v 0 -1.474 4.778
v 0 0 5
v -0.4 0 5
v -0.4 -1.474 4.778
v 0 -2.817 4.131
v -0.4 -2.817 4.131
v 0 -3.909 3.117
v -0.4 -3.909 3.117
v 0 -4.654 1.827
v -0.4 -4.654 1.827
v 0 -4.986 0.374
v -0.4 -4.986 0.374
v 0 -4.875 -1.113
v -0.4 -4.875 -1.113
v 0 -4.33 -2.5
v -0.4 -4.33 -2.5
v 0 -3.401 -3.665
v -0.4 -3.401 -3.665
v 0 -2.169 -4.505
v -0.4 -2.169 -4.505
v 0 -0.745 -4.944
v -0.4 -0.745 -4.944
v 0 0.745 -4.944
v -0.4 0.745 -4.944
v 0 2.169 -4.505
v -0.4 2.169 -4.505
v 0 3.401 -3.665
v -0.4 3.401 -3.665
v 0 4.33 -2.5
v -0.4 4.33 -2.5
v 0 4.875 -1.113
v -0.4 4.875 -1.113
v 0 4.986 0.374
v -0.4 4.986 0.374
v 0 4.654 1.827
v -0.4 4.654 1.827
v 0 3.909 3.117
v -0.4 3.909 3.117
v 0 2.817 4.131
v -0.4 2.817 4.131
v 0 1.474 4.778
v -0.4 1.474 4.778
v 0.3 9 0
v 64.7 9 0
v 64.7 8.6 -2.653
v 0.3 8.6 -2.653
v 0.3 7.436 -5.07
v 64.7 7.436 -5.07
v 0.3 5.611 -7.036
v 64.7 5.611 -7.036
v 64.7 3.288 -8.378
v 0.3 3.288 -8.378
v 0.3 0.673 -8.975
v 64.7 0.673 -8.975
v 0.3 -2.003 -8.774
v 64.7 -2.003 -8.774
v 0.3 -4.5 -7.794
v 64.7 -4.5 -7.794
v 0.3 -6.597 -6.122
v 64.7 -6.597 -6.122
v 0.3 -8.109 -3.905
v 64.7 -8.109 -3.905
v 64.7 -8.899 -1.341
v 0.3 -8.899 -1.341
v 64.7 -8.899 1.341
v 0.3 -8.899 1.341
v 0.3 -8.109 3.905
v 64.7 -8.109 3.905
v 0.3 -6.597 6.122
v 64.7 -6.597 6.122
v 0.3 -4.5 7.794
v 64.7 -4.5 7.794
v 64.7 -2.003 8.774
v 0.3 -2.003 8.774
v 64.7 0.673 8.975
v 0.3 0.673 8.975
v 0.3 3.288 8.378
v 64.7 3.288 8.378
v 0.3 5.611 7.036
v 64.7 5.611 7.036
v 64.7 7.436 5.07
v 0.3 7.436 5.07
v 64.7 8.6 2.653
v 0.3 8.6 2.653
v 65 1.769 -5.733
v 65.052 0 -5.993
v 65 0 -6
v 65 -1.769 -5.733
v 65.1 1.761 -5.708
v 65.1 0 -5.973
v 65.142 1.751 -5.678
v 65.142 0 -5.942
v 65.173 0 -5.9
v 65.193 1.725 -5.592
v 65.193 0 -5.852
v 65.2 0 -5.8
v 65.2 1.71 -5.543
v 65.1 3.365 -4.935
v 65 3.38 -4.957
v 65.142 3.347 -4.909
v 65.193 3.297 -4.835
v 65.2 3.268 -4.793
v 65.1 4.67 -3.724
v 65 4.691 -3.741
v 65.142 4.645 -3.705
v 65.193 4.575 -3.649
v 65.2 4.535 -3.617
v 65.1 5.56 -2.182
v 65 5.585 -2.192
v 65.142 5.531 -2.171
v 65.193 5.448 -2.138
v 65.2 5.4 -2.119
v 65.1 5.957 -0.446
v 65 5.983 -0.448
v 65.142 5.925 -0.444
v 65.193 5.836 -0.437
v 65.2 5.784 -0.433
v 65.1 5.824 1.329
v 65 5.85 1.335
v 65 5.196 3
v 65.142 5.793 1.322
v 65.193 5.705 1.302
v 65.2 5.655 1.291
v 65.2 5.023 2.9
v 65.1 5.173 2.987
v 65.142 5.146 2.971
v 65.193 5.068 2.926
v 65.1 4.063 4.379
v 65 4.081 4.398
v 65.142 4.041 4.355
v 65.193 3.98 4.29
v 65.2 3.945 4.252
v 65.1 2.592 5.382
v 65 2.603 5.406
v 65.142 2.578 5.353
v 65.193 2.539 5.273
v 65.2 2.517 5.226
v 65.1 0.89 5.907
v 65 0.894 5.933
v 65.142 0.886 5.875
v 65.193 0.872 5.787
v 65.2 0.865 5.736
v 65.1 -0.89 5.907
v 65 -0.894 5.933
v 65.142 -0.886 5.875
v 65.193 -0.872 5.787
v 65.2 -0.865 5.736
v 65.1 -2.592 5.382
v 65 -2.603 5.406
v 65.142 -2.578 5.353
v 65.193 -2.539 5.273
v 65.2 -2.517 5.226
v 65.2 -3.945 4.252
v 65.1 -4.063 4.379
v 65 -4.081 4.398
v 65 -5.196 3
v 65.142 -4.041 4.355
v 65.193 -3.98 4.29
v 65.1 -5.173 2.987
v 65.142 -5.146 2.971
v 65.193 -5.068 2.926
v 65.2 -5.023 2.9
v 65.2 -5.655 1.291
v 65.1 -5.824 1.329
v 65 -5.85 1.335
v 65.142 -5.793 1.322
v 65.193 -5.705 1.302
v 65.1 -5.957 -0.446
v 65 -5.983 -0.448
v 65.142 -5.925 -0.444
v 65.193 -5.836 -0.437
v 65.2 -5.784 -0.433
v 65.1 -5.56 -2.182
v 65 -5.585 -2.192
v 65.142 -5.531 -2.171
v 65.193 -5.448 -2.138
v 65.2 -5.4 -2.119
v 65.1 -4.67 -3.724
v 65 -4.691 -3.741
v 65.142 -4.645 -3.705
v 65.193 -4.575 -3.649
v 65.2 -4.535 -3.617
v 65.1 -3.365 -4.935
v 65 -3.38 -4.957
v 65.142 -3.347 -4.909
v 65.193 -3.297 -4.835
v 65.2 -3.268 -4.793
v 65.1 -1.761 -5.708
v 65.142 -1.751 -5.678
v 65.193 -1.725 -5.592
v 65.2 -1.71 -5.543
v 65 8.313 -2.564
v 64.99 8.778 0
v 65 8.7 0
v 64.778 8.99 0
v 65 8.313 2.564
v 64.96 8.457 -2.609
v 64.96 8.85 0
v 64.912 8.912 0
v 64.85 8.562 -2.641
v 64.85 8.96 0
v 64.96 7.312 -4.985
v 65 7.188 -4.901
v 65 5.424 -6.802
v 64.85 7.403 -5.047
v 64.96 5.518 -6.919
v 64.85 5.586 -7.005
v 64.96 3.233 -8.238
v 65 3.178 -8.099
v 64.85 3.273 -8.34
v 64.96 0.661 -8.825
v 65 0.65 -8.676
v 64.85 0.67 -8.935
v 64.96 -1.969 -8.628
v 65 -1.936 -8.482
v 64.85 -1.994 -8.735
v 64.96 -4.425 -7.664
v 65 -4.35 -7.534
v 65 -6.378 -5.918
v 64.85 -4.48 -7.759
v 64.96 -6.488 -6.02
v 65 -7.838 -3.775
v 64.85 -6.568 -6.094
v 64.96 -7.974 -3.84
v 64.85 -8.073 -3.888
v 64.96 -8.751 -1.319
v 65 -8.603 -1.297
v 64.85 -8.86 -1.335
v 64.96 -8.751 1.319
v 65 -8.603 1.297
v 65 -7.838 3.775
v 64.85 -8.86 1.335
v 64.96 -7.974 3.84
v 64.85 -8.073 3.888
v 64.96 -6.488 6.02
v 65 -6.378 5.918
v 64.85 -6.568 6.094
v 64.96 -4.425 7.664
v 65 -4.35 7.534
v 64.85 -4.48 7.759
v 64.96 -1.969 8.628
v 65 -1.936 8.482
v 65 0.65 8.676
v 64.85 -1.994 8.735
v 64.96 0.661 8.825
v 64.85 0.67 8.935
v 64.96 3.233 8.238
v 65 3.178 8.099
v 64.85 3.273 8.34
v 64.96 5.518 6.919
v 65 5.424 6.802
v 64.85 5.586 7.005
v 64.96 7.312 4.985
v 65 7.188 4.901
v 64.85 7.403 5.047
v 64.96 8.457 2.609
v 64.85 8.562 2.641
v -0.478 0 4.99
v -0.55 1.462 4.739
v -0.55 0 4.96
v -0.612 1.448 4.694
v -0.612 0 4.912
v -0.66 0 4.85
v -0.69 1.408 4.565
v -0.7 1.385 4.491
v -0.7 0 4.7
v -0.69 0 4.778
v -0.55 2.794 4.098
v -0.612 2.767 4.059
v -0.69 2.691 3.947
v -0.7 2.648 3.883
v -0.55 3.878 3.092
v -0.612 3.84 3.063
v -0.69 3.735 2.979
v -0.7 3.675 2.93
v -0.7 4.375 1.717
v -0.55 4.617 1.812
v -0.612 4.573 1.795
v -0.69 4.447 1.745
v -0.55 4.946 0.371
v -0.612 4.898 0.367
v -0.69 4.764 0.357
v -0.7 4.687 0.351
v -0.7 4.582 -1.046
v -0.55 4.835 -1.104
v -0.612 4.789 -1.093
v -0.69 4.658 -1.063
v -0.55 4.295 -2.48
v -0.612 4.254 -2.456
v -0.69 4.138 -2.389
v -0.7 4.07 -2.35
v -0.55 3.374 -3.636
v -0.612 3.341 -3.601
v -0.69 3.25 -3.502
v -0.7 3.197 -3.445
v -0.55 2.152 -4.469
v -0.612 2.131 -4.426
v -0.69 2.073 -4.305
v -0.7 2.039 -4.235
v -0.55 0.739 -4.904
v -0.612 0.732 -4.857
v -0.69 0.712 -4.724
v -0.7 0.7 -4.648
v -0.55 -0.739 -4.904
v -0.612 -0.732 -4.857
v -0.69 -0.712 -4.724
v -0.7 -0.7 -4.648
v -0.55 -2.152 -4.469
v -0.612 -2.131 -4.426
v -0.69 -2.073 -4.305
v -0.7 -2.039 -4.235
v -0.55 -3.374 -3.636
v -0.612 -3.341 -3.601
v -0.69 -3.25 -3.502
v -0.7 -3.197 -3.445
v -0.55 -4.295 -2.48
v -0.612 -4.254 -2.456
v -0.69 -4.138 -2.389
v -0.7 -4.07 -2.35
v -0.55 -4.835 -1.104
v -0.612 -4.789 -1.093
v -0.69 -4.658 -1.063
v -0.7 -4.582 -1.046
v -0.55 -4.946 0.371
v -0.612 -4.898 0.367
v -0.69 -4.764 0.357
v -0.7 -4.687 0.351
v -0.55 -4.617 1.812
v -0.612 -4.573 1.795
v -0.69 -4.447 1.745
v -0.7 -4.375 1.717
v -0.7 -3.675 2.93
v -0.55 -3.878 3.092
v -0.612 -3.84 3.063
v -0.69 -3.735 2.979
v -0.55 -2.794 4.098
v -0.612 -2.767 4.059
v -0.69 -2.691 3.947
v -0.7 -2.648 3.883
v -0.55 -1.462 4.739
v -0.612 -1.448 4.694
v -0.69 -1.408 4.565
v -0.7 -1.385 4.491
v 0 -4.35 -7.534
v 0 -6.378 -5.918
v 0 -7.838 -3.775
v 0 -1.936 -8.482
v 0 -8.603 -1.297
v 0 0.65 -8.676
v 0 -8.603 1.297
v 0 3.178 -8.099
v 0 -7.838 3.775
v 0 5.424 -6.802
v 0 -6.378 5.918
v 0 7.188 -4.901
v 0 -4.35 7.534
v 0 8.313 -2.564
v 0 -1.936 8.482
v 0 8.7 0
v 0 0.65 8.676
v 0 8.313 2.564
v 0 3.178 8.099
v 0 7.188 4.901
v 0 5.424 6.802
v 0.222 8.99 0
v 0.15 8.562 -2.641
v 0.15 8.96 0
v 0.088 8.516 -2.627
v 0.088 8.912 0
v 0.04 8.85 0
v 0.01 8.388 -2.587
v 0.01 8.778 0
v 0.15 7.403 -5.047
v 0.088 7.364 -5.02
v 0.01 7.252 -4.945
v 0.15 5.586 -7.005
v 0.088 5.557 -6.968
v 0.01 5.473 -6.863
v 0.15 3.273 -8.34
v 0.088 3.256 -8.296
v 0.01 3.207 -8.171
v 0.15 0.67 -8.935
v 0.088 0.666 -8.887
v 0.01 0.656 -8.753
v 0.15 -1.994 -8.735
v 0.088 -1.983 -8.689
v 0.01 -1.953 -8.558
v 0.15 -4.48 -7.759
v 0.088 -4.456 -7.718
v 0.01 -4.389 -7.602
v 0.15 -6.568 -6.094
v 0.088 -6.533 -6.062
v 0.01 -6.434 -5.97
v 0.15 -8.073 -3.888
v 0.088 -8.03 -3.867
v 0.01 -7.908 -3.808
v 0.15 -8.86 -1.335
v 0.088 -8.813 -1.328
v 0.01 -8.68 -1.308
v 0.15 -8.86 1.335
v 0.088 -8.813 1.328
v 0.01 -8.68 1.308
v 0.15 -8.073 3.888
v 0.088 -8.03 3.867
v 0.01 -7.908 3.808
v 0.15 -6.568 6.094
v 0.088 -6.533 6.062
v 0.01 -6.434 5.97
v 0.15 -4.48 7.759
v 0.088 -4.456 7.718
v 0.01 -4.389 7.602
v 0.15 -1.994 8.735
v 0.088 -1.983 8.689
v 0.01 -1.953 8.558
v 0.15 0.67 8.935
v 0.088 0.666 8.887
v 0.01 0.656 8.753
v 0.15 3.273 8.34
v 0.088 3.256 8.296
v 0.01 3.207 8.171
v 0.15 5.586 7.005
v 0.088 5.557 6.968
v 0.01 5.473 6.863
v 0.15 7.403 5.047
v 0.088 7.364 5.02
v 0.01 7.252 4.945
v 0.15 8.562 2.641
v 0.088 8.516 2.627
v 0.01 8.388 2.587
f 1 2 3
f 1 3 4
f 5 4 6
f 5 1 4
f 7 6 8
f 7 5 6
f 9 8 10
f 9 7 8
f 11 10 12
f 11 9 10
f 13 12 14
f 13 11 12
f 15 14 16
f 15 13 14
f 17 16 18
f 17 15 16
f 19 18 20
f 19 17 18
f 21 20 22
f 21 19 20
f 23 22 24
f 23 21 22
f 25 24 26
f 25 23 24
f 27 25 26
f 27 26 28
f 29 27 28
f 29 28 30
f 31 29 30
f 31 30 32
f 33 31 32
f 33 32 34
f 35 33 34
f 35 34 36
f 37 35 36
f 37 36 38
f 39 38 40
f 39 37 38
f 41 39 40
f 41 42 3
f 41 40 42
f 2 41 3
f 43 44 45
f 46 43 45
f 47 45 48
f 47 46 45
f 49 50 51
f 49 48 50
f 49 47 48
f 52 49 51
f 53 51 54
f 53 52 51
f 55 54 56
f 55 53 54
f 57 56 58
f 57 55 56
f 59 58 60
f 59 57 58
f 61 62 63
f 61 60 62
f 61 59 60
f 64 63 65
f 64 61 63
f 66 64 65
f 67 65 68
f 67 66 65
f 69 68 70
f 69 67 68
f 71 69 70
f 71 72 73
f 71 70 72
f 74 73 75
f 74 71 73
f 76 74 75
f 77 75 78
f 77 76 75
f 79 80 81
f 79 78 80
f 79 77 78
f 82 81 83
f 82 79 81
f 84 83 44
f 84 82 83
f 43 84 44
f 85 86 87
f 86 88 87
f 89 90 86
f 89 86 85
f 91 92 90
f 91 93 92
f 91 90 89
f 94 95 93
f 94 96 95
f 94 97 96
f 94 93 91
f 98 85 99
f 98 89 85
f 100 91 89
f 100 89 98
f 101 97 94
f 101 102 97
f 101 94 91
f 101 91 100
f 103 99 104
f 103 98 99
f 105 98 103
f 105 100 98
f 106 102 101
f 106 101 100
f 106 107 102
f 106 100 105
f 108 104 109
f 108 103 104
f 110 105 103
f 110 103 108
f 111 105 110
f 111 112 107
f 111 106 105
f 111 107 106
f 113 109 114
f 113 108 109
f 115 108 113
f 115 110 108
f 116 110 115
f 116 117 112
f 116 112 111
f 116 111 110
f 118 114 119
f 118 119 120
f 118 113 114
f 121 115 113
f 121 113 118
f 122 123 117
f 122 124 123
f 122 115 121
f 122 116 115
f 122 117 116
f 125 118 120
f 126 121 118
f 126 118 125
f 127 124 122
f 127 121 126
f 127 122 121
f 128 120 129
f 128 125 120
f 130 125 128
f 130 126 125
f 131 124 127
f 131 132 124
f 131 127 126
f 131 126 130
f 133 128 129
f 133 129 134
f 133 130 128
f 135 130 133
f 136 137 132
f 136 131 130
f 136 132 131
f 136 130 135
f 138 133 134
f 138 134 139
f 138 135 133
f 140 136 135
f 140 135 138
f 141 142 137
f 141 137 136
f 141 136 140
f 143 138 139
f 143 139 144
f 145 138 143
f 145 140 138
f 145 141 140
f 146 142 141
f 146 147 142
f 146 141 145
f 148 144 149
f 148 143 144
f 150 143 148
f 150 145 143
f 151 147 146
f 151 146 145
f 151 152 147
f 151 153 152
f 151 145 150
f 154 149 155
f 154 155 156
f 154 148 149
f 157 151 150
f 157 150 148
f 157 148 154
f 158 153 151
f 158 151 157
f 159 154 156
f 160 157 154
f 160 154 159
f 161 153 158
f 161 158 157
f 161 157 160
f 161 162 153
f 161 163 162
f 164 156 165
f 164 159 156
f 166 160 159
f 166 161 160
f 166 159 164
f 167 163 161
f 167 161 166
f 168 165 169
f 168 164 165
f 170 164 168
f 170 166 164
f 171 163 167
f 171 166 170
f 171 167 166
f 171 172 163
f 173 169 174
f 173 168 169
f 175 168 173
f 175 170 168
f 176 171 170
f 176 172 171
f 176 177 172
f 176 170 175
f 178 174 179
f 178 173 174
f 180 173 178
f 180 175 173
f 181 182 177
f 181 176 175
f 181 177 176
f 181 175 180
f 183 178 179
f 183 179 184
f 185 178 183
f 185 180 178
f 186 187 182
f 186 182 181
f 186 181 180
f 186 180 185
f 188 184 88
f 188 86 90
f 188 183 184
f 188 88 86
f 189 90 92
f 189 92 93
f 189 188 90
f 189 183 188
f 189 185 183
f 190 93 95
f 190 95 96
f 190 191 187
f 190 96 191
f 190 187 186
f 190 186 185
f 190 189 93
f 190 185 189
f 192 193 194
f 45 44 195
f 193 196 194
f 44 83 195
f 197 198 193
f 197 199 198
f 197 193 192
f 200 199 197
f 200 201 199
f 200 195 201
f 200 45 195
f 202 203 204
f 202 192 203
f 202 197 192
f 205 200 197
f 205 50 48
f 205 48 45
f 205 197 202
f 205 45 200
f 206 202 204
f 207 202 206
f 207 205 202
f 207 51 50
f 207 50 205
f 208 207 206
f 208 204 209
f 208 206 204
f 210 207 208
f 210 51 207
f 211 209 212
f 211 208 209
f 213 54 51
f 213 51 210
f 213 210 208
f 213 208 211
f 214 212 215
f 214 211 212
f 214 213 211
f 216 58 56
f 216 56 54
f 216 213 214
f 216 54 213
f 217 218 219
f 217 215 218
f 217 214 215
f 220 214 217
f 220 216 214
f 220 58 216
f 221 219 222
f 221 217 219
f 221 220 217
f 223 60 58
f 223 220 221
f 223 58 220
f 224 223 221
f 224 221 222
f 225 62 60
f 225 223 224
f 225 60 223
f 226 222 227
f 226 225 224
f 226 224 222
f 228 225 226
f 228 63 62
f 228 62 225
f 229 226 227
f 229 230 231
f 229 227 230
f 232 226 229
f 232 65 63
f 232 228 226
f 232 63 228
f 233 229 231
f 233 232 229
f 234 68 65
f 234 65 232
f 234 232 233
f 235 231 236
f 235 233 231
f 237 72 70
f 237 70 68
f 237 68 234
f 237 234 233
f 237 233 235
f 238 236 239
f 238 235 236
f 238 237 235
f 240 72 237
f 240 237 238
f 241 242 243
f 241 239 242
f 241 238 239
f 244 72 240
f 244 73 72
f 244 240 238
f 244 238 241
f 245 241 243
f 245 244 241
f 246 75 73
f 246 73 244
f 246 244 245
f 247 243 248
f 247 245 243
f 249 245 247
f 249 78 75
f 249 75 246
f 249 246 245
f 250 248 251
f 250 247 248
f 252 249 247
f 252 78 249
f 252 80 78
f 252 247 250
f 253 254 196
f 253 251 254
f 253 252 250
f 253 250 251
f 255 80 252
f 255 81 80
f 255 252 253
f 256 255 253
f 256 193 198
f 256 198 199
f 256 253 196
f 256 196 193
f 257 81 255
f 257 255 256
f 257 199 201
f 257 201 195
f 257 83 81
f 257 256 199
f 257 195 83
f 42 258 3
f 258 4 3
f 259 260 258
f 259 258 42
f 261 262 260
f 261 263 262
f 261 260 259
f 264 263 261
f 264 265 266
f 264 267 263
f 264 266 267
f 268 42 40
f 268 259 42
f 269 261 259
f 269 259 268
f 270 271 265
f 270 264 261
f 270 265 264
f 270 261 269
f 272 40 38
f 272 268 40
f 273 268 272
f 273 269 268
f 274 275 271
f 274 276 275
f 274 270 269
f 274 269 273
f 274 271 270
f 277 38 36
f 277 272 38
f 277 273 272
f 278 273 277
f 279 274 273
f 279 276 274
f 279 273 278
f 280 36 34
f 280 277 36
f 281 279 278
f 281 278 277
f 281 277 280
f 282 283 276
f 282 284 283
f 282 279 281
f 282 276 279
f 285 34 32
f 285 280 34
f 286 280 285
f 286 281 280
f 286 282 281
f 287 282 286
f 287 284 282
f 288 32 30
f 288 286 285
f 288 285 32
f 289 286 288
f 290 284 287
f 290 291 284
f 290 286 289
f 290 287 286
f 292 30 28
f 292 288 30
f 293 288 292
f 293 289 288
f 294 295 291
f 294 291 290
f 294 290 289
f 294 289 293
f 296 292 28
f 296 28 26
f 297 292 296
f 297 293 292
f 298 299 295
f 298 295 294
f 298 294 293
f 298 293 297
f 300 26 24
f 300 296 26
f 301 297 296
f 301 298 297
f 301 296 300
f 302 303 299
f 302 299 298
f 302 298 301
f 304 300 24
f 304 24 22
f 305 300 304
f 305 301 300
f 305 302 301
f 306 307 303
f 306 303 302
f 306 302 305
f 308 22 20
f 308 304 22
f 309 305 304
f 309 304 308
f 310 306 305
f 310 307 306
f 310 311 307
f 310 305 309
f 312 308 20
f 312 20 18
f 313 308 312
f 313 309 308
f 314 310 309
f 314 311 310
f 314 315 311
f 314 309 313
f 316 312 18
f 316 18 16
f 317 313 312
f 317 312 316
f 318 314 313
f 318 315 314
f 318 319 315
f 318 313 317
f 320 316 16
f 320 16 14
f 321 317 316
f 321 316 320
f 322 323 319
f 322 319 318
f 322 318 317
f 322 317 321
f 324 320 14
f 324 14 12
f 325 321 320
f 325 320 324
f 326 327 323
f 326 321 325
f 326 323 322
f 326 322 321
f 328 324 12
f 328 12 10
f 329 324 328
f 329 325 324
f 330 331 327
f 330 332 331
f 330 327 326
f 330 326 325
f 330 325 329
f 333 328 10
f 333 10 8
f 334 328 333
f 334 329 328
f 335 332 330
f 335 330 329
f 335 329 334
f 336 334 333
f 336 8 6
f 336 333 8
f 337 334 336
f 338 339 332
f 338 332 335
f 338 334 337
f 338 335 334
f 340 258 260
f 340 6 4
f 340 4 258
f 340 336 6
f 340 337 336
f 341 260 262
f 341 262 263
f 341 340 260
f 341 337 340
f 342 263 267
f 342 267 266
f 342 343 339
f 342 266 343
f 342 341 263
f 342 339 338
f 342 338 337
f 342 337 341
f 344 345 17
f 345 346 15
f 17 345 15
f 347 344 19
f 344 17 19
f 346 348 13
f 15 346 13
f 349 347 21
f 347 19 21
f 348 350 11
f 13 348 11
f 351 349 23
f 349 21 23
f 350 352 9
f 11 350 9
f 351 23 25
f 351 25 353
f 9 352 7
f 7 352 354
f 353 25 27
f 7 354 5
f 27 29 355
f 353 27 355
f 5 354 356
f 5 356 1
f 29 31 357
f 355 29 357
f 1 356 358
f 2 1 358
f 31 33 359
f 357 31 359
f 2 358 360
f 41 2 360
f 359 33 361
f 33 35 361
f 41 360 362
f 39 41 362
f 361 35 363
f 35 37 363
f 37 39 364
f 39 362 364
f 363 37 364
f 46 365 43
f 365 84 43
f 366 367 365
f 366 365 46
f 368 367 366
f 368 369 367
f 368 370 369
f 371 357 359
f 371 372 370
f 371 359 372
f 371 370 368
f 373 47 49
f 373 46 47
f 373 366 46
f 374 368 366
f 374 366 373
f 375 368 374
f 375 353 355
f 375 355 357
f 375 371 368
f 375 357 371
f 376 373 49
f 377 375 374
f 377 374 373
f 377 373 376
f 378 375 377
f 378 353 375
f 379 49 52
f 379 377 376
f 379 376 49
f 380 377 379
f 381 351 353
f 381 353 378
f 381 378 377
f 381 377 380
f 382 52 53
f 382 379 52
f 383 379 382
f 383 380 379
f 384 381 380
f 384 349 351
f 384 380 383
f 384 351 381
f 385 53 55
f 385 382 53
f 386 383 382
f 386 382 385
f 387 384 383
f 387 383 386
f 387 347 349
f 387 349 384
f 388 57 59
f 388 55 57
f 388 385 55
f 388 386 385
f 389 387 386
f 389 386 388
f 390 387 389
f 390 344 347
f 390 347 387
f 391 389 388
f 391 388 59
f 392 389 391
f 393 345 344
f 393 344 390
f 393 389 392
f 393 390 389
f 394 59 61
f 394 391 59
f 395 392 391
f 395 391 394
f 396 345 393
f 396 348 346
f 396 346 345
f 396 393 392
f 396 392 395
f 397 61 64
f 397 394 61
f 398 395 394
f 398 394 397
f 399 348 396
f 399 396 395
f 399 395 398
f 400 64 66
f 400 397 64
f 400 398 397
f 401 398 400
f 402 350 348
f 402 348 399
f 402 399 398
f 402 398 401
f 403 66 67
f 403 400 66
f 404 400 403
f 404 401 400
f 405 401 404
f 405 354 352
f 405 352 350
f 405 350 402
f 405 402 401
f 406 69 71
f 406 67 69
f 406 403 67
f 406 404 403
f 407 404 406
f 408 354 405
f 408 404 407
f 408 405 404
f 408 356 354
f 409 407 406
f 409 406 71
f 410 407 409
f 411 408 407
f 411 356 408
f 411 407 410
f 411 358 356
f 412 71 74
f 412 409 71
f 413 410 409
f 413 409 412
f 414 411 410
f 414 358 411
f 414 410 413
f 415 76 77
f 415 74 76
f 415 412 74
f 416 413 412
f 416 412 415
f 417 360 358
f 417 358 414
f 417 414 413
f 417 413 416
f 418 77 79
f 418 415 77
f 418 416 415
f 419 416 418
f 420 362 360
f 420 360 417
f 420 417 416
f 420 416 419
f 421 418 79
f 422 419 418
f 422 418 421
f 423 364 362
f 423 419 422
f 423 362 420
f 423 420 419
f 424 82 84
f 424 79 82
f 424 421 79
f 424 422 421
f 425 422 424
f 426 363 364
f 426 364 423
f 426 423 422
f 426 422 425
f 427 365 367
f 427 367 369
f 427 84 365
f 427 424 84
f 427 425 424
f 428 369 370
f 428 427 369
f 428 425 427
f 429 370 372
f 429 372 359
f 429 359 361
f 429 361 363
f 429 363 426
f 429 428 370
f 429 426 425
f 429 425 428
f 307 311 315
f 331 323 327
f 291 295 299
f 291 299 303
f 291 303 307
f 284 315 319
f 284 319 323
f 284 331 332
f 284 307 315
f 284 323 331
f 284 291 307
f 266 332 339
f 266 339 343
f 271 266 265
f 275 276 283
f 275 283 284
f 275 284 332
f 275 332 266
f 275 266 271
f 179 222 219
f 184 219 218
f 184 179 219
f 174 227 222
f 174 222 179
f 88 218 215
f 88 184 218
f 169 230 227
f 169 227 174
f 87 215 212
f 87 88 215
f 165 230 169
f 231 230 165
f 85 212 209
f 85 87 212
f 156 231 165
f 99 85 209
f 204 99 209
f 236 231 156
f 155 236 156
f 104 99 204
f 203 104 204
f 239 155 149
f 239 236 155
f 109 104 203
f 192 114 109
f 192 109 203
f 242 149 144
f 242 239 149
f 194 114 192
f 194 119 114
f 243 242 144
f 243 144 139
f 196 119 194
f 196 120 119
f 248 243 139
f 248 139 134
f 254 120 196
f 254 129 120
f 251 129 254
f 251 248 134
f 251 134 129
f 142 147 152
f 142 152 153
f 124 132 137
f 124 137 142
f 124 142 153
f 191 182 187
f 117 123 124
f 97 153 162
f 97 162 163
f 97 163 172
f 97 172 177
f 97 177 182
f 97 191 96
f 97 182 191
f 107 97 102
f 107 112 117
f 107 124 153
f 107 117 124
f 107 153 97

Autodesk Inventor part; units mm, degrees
ref_plane "YZ Plane" through (0, 0, 0) normal (1, 0, 0) x (0, 1, 0)
ref_plane "XZ Plane" through (0, 0, 0) normal (0, 1, 0) x (-1, 0, 0)
ref_plane "XY Plane" through (0, 0, 0) normal (0, 0, 1) x (1, 0, 0)
sketch "Sketch1" plane through (0, 0, 0) normal (1, 0, 0) x (0, 1, 0)
  circle A0 centre (0, 0) radius 9
  dimension "d0" = 18
extrude "Extrusion1" add sketch "Sketch1" along normal blind 65
sketch "Sketch2" plane through (65, 0, 0) normal (1, 0, 0) x (0, 0, -1)
  circle A0 centre (0, 0) radius 6
  dimension "d3" = 12
extrude "Extrusion2" add sketch "Sketch2" along normal blind 0.2
fillet "Fillet1" radius 0.2 1 edges at (65.2, 0, 6)
fillet "Fillet2" radius 0.3 1 edges at (65, -9, 0)
fillet "Fillet3" radius 0.3 1 edges at (0, -9, 0)
sketch "Sketch3" plane through (0, 0, 0) normal (-1, 0, 0) x (0, 0, 1)
  circle A0 centre (0, 0) radius 5
  dimension "d9" = 10
extrude "Extrusion3" add sketch "Sketch3" along normal blind 0.7
fillet "Fillet4" radius 0.3 1 edges at (-0.7, 0, -5)
properties part number "18650-battery"
